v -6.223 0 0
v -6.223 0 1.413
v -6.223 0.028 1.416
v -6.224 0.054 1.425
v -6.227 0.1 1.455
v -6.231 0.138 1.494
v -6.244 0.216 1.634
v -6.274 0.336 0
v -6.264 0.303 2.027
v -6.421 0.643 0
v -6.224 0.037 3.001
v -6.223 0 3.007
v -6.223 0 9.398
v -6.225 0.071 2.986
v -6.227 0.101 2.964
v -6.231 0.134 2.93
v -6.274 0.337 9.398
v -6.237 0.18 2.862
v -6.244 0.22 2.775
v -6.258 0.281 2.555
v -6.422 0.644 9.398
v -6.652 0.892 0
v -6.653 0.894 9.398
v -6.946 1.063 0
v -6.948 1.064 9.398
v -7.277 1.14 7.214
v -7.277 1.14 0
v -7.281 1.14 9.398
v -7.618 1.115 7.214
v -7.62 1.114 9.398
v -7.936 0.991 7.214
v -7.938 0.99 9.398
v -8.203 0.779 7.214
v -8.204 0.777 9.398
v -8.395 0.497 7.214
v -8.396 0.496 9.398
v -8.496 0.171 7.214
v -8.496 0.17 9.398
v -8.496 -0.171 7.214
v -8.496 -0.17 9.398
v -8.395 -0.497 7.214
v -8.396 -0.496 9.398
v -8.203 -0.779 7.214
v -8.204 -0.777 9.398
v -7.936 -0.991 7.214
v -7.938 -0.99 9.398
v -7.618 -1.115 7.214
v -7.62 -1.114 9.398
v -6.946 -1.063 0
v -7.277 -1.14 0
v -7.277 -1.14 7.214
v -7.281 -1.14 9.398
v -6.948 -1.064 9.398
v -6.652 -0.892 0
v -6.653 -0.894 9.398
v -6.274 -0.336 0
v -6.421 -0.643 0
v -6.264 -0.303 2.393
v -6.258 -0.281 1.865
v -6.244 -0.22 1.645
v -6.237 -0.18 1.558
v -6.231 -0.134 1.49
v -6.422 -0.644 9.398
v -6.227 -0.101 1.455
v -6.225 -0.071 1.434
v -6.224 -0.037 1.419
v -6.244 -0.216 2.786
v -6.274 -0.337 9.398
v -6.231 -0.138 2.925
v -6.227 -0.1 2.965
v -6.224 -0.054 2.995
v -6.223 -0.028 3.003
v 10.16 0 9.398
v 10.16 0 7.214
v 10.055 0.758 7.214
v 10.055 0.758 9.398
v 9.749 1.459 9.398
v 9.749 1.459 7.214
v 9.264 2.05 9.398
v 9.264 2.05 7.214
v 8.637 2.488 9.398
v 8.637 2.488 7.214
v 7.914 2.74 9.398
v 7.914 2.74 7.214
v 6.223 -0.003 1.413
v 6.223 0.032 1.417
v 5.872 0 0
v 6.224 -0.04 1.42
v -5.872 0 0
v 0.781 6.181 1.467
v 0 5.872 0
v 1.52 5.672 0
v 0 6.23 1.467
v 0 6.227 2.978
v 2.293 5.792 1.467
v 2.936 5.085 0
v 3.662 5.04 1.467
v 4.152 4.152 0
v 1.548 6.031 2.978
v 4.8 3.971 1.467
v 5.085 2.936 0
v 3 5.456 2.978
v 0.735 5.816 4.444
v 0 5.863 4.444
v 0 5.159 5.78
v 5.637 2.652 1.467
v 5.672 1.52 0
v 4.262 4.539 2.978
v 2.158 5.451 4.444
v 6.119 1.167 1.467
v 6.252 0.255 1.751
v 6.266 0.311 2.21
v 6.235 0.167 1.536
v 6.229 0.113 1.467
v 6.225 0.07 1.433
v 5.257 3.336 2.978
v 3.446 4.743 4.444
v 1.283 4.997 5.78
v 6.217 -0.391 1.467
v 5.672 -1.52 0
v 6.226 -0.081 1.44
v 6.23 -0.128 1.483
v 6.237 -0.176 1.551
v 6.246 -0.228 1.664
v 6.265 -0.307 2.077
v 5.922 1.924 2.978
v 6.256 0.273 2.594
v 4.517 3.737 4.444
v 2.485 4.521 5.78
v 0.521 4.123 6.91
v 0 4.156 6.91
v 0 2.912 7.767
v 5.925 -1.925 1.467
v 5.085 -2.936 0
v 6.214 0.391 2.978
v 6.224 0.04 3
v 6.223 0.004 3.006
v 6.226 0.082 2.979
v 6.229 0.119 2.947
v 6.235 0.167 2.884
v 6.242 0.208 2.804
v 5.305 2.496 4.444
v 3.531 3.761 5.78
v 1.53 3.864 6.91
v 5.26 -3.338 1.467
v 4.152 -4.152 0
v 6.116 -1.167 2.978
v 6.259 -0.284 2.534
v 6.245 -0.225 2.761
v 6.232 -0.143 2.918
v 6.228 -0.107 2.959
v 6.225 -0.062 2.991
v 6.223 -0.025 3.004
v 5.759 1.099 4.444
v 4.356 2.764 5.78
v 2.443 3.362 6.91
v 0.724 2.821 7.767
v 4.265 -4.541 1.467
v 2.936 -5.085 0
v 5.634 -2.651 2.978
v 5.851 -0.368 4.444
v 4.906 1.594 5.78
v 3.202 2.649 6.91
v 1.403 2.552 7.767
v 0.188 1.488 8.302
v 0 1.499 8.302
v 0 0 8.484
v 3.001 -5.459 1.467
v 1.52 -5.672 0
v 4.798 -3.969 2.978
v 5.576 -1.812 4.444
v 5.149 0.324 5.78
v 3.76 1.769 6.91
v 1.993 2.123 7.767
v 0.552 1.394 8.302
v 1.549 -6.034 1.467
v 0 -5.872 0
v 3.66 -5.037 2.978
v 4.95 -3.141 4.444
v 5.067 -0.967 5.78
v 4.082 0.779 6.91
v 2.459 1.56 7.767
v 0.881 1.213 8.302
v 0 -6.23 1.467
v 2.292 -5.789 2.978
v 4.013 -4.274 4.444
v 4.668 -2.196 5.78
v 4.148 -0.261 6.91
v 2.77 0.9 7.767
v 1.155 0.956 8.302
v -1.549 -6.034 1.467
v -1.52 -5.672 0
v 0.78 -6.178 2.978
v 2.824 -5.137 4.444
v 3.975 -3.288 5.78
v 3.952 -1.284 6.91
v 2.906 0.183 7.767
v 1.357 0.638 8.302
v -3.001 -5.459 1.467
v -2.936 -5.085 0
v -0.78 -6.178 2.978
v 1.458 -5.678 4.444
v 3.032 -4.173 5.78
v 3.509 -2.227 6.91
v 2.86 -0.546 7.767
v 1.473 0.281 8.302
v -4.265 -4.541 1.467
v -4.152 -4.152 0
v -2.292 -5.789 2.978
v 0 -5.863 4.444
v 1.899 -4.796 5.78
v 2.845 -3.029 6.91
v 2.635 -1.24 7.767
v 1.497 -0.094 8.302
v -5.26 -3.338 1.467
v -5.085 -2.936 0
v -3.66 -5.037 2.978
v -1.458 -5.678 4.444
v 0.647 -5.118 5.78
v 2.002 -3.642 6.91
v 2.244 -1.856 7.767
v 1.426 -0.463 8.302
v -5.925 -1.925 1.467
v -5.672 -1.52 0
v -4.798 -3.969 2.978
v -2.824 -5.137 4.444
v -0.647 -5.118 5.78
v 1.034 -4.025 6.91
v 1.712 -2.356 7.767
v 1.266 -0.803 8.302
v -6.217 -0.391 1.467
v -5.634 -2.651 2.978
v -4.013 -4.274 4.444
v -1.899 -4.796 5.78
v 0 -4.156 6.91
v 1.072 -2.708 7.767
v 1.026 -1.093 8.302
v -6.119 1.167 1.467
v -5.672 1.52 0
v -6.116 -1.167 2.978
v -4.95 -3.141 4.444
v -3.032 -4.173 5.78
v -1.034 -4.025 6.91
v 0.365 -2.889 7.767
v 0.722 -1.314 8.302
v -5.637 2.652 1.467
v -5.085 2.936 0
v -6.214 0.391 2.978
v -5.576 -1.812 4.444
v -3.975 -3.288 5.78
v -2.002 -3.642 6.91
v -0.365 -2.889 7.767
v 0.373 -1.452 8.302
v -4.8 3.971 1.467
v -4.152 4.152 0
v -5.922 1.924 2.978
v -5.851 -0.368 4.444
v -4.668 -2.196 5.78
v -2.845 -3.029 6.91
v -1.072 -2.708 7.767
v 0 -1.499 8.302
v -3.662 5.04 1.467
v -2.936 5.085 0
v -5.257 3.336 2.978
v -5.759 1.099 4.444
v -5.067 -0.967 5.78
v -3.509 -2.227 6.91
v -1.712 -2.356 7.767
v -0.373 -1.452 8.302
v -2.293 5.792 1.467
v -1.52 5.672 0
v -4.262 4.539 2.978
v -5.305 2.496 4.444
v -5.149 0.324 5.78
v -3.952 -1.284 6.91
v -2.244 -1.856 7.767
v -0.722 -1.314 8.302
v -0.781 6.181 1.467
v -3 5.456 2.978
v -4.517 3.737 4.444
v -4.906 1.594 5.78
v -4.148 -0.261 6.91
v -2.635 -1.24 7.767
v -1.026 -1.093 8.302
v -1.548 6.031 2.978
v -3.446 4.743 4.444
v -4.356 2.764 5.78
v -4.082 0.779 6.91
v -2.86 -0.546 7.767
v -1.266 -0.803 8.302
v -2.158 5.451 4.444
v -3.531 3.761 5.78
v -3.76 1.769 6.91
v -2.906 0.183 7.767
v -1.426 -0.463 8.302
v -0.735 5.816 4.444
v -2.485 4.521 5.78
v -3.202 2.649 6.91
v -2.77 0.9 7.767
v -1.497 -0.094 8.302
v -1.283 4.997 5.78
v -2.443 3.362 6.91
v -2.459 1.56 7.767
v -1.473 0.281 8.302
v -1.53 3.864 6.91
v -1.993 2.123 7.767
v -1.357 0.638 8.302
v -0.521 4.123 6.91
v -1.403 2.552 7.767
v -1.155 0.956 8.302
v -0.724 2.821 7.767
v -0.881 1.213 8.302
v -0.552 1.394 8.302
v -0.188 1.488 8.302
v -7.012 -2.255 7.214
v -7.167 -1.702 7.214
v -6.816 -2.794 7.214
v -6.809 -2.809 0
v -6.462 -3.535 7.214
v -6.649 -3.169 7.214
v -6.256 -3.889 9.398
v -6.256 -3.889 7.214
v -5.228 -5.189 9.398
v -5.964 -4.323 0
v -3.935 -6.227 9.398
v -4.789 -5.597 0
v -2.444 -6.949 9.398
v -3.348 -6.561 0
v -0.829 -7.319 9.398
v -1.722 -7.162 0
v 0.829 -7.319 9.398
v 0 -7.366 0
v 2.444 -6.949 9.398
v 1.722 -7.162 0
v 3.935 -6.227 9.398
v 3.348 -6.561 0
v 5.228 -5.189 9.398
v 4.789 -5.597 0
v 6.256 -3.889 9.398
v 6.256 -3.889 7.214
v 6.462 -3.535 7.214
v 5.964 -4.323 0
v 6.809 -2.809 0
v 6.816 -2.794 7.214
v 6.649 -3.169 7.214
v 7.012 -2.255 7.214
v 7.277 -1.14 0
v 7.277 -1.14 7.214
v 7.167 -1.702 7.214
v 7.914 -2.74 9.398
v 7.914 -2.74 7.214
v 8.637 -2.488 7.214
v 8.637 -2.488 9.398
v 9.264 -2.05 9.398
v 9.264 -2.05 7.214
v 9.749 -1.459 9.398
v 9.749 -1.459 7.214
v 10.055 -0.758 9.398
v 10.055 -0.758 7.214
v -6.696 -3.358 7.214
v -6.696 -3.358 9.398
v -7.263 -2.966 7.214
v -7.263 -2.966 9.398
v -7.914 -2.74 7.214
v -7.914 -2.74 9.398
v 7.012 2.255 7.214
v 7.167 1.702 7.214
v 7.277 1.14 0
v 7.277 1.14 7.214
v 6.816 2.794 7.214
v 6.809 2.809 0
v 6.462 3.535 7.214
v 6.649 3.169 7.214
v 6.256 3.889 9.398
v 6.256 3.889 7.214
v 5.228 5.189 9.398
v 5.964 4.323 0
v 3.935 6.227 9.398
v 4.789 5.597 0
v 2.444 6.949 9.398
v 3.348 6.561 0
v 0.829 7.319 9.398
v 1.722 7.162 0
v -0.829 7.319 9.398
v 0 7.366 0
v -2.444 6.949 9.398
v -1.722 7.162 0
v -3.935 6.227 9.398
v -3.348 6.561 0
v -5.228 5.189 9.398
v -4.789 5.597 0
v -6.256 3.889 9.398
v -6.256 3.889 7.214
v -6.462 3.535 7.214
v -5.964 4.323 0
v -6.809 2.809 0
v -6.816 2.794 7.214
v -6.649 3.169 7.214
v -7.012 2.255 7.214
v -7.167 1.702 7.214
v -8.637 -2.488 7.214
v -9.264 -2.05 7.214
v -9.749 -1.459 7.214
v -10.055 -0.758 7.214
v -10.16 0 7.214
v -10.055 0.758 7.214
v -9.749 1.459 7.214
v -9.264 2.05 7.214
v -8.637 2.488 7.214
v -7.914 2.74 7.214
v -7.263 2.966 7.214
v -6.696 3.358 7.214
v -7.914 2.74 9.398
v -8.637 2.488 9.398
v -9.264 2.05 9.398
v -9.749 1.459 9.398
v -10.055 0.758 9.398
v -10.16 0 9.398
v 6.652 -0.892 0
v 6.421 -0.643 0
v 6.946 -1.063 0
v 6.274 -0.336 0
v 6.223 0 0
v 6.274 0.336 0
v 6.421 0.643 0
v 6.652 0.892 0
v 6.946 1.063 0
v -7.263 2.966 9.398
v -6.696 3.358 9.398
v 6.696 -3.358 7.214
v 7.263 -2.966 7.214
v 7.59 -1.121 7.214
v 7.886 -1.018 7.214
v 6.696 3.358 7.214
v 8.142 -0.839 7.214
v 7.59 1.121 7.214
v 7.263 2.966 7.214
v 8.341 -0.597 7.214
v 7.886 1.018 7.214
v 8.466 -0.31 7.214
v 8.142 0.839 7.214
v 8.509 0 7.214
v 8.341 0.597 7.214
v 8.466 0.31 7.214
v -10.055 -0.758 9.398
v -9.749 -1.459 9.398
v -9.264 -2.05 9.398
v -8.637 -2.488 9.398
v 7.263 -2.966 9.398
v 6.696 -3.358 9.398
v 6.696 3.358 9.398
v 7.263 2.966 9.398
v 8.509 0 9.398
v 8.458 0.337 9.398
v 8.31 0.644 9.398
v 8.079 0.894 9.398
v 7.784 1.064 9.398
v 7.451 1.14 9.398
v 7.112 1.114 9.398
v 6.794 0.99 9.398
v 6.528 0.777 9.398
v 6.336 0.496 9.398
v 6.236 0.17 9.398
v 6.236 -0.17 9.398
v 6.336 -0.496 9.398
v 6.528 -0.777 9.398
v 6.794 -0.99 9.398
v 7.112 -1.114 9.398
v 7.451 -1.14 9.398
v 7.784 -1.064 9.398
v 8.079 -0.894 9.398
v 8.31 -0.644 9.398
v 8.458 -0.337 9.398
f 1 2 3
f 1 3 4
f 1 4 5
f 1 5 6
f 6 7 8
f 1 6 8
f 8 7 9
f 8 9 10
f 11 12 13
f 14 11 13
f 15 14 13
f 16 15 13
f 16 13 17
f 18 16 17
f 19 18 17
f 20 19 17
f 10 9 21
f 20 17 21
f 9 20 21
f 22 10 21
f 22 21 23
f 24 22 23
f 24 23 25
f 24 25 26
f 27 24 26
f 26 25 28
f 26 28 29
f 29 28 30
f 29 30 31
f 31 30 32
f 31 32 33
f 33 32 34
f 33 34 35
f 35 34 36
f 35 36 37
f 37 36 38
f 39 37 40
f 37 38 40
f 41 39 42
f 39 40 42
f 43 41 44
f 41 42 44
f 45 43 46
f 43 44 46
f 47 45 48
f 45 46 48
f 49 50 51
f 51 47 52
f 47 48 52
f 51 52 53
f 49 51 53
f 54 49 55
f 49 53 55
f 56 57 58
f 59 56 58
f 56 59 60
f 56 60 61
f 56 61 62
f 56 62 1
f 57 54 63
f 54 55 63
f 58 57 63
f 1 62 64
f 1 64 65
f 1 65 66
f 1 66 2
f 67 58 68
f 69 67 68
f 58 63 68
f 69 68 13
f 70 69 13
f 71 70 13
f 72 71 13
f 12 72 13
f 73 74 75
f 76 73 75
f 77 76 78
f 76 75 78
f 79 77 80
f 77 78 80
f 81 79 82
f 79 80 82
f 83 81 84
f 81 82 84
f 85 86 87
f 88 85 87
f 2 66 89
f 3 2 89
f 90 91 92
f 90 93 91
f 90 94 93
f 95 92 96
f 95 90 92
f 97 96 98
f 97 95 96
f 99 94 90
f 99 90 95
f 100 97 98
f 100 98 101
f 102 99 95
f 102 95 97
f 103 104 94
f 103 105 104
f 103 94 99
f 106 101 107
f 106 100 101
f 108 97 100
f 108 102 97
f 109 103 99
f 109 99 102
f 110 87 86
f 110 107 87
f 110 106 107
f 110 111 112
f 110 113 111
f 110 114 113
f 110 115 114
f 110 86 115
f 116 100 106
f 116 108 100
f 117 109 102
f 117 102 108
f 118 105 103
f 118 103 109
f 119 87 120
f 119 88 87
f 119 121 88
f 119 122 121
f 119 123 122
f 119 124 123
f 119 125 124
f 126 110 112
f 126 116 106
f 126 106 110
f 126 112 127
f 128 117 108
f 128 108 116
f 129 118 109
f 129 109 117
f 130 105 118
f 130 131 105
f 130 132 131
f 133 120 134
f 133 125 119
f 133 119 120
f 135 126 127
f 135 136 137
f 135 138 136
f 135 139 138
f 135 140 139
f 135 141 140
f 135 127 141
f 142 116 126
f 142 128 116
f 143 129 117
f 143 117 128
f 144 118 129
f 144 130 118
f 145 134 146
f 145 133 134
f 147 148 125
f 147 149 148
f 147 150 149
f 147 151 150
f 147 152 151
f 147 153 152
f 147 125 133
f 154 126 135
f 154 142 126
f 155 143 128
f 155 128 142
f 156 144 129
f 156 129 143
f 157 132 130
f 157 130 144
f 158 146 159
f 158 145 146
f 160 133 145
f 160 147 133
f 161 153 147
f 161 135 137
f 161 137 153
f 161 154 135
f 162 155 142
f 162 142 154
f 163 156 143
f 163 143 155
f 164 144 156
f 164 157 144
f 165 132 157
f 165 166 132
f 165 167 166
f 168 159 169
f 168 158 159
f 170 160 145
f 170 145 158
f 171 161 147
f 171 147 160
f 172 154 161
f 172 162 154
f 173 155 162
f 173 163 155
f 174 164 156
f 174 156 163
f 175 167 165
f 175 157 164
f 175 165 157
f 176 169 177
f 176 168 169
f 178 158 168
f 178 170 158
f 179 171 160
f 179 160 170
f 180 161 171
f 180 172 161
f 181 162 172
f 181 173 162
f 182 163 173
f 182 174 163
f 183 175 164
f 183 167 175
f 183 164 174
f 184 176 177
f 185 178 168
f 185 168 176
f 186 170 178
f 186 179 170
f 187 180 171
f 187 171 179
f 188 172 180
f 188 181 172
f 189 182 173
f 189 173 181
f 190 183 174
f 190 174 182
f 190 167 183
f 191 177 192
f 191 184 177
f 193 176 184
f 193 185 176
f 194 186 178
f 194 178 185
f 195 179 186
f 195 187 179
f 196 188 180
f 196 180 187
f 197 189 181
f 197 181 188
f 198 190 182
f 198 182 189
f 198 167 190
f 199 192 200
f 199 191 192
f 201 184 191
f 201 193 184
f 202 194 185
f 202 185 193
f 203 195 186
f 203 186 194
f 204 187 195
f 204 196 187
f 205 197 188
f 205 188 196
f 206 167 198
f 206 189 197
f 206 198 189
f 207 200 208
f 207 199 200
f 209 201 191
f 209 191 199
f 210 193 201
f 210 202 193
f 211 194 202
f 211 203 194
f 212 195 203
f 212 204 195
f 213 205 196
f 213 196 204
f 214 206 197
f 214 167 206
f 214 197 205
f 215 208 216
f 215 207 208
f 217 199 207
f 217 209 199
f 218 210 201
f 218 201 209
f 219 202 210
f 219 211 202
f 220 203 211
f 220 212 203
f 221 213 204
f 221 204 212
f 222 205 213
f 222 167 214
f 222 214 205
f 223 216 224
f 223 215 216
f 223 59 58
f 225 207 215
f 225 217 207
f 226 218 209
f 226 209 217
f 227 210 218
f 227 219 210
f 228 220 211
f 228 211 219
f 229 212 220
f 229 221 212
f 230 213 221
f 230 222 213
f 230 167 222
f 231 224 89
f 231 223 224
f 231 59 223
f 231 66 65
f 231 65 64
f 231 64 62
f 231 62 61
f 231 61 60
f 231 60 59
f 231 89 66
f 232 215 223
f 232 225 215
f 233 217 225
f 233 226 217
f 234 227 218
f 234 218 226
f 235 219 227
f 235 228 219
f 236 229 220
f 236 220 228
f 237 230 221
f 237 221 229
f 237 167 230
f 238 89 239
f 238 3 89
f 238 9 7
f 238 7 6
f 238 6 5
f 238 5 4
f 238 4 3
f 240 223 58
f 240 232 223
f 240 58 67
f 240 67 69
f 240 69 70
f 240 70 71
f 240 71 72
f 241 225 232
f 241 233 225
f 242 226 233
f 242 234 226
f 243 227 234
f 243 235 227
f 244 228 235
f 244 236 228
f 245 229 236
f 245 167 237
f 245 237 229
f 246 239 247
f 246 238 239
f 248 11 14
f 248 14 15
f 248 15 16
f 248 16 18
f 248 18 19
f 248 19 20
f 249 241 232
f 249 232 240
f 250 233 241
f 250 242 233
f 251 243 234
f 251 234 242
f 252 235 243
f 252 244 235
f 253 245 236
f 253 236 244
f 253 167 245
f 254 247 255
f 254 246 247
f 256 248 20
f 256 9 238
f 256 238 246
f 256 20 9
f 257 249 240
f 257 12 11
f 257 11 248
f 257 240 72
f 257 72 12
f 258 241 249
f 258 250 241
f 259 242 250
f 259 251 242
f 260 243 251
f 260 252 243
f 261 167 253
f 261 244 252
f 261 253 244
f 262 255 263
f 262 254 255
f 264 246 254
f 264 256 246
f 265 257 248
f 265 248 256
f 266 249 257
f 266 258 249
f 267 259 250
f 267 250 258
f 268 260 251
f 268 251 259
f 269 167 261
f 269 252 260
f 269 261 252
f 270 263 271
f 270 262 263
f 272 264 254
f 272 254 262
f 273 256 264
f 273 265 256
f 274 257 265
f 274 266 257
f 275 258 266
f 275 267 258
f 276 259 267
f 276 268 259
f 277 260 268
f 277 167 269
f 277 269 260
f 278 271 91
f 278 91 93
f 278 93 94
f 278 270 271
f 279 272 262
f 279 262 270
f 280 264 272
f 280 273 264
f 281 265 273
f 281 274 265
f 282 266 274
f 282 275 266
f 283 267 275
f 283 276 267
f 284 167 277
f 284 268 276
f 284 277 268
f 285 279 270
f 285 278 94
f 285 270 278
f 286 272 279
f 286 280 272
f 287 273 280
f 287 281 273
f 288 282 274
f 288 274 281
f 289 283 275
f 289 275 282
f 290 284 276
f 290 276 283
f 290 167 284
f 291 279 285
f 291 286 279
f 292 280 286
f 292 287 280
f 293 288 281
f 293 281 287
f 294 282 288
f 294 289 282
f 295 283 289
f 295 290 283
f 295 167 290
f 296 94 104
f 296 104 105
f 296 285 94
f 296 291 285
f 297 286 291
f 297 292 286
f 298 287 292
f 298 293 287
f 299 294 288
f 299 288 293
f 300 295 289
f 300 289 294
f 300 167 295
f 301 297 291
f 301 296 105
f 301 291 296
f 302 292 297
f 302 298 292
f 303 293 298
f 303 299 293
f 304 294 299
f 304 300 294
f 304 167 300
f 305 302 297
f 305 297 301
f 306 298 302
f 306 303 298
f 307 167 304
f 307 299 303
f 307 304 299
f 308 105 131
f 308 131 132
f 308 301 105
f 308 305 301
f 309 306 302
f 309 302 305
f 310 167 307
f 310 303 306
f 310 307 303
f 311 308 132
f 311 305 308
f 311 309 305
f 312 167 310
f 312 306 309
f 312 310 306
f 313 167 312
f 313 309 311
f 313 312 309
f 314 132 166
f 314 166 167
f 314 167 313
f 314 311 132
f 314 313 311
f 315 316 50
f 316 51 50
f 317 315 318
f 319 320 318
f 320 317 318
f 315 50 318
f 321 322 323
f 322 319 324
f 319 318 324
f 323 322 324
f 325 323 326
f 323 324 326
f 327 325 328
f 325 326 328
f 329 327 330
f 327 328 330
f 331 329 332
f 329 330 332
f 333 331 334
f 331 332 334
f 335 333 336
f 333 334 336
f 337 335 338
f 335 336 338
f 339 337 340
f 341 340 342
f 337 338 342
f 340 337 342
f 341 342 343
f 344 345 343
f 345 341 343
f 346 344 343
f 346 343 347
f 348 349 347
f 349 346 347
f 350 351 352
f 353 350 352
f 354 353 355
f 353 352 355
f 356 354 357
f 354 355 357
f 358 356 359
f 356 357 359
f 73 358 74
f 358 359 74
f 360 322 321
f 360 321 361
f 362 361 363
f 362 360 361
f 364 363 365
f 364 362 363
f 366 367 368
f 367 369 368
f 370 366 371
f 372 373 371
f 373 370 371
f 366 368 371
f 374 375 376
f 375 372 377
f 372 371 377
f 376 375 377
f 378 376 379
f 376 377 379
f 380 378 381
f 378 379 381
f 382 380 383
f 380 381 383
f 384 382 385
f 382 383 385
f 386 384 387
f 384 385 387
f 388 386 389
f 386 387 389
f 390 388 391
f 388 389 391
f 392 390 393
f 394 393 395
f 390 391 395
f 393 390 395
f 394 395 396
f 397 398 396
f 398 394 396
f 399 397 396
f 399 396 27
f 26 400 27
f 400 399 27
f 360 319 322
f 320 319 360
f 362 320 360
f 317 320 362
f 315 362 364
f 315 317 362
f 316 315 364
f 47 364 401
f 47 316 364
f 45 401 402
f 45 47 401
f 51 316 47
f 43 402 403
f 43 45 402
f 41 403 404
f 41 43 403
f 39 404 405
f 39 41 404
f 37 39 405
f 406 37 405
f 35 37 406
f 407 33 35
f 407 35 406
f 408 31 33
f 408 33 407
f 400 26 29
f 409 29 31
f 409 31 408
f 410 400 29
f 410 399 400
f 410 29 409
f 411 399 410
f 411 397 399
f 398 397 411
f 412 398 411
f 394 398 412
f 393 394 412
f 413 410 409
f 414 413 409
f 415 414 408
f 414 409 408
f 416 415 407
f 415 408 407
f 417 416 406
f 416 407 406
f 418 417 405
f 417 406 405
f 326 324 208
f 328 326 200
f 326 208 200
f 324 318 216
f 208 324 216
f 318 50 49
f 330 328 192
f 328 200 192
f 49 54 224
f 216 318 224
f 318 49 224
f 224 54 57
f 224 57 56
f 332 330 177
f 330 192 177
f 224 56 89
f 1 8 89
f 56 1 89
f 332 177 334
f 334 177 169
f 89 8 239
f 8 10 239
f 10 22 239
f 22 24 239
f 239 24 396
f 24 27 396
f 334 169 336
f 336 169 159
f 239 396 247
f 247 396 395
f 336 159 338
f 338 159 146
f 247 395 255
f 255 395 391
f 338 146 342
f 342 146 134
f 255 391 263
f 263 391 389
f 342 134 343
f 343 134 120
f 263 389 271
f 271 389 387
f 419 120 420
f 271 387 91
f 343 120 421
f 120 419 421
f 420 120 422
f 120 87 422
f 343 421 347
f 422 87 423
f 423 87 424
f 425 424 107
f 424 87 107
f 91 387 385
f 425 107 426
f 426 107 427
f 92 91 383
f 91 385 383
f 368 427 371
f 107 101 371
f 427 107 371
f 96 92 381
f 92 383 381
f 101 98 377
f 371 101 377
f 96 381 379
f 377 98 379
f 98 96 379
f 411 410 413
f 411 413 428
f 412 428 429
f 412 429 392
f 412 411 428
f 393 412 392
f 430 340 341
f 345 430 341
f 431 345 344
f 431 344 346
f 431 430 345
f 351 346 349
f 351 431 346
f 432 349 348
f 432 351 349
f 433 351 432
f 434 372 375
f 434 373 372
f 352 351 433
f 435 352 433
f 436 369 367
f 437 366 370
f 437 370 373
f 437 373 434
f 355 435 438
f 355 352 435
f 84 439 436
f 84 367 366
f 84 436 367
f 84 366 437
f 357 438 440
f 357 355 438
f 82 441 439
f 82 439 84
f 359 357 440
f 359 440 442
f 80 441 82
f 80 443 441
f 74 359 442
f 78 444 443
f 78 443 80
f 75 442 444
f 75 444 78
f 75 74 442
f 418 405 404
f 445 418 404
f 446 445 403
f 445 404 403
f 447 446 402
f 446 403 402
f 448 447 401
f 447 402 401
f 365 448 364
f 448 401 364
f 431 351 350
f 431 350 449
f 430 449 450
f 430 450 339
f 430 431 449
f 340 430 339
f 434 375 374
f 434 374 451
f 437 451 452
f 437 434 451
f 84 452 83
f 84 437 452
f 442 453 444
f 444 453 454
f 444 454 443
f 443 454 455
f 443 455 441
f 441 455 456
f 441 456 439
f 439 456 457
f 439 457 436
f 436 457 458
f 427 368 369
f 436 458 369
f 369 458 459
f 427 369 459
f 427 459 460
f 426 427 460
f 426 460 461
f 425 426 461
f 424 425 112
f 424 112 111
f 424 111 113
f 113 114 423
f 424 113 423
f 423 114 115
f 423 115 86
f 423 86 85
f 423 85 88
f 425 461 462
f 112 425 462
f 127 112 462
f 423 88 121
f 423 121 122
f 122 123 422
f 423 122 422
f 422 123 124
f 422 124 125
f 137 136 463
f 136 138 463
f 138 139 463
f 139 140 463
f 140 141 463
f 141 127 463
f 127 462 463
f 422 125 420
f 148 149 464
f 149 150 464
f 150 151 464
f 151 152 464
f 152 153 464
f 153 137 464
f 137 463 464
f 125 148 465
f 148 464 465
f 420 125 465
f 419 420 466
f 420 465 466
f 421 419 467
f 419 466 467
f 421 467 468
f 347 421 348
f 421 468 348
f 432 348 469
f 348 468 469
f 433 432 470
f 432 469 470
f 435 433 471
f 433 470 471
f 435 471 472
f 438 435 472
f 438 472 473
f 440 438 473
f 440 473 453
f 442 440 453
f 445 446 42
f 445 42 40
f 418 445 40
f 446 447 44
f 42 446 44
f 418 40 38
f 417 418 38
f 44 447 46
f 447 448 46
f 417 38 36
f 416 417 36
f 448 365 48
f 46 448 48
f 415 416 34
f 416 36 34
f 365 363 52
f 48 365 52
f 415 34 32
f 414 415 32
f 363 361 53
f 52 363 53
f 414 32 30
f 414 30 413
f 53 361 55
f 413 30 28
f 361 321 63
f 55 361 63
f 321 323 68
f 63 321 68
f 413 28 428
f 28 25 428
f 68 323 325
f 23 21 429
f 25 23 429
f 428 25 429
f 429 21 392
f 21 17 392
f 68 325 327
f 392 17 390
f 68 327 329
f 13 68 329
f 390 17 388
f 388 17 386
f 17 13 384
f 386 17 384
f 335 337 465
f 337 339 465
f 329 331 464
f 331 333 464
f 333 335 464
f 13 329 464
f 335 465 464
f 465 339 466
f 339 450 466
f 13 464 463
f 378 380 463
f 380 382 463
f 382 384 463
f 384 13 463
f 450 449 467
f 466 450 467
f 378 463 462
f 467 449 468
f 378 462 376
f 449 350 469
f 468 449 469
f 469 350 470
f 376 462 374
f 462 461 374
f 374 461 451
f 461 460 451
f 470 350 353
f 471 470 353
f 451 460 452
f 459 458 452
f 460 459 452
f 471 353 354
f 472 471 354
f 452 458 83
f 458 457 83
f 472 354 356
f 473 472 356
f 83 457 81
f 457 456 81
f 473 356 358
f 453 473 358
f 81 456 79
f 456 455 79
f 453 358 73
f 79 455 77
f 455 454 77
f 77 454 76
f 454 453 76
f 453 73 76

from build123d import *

# Parameters (mm, degrees)
ESQUISSE1_R             = 7.366
BOSS_EXTRU_1_DEPTH      = 9.398
BOSS_EXTRU_2_START      = -2.1844
BOSS_EXTRU_2_DEPTH      = 2.1844
CONG_1_R                = 2.54
ESQUISSE3_R             = 1.143
ENL_V_MAT_EXTRU_2_DEPTH = 16.678200152


with BuildPart() as part:
    # Esquisse1 → Boss.-Extru.1 (new body)
    with BuildSketch(Plane.XY):
        Circle(ESQUISSE1_R)
    extrude(amount=BOSS_EXTRU_1_DEPTH)

    # Esquisse2 → Boss.-Extru.2 (add)
    with BuildSketch(Plane.XY.offset(9.398).offset(BOSS_EXTRU_2_START)):
        with BuildLine():
            Line((7.366, 2.794), (6.815535195, 2.794))
            ThreePointArc((6.815535195, 2.794), (7.22707369, 1.423854584), (7.366, 0))
            Line((7.366, 0), (10.16, 0))
            ThreePointArc((10.16, 0), (9.341656347, 1.975656347), (7.366, 2.794))
        make_face()
        with BuildLine():
            Line((10.16, 0), (7.366, 0))
            ThreePointArc((7.366, 0), (7.22707369, -1.423854584), (6.815535195, -2.794))
            Line((6.815535195, -2.794), (7.366, -2.794))
            ThreePointArc((7.366, -2.794), (9.341656347, -1.975656347), (10.16, 0))
        make_face()
        with BuildLine():
            Line((-7.366, 0), (-10.16, 0))
            ThreePointArc((-10.16, 0), (-9.341656347, -1.975656347), (-7.366, -2.794))
            Line((-7.366, -2.794), (-6.815535195, -2.794))
            ThreePointArc((-6.815535195, -2.794), (-7.22707369, -1.423854584), (-7.366, 0))
        make_face()
        with BuildLine():
            Line((-6.815535195, 2.794), (-7.366, 2.794))
            ThreePointArc((-7.366, 2.794), (-9.341656347, 1.975656347), (-10.16, 0))
            Line((-10.16, 0), (-7.366, 0))
            ThreePointArc((-7.366, 0), (-7.22707369, 1.423854584), (-6.815535195, 2.794))
        make_face()
    extrude(amount=BOSS_EXTRU_2_DEPTH)

    # Congé1
    # the kernel refuses this fillet: 2.54 mm, written as the material it adds along each edge
    with BuildSketch(Plane(origin=(6.815535195, 2.794, 7.2136), x_dir=(-0.45524151464262924, 0.8903679932173465, 0), z_dir=(0, 0, 1)), Plane(origin=(-6.815535195, -2.794, 7.2136), x_dir=(0.4552415146426176, -0.8903679932173524, 0), z_dir=(0, 0, 1))) as cong_1_piece_1:
        with BuildLine():
            CenterArc((1.442130851, -2.531130754), CONG_1_R, 94.789504406, 46.813825589)
            Line((-0.548542223, -0.953531086), (-0.74760953, -0.795771119))
            ThreePointArc((-0.74760953, -0.795771119), (-0.476747902, -0.374484899), (-0.22615347, 0.115631345))
            Line((-0.22615347, 0.115631345), (0.021207807, 0.253113075))
            ThreePointArc((0.021207807, 0.253113075), (0.615026392, 0.228279187), (1.208844978, 0.253113075))
            Line((1.208844978, 0.253113075), (1.230052785, 0))
        make_face()
    extrude(amount=2.1844)
    with BuildSketch(Plane(origin=(6.815535195, -2.794, 7.2136), x_dir=(-0.4552415146426287, -0.8903679932173468, 0), z_dir=(0, 0, 1)), Plane(origin=(-6.815535195, 2.794, 7.2136), x_dir=(0.45524151464261825, 0.890367993217352, 0), z_dir=(0, 0, 1))) as cong_1_piece_2:
        with BuildLine():
            CenterArc((1.442130851, 2.531130754), CONG_1_R, 218.396670004, 46.813825589)
            Line((-0.548542223, 0.953531086), (-0.74760953, 0.795771119))
            ThreePointArc((-0.74760953, 0.795771119), (-0.476747902, 0.374484899), (-0.22615347, -0.115631345))
            Line((-0.22615347, -0.115631345), (0.021207807, -0.253113075))
            ThreePointArc((0.021207807, -0.253113075), (0.615026392, -0.228279187), (1.208844978, -0.253113075))
            Line((1.208844978, -0.253113075), (1.230052785, 0))
        make_face()
    extrude(amount=2.1844)

    # Esquisse3 → Enlèv. mat.-Extru.2 (cut, through all)
    with BuildSketch(Plane.XY.offset(9.398)):
        with Locations((-7.366, 0)):
            Circle(ESQUISSE3_R)
        with Locations((7.366, 0)):
            Circle(ESQUISSE3_R)
    extrude(amount=-ENL_V_MAT_EXTRU_2_DEPTH, mode=Mode.SUBTRACT)

    # Esquisse4 → Cut-Revolve1 (revolve, cut)
    with BuildSketch(Plane(origin=(0, 0, 0), x_dir=(0, 0, -1), z_dir=(1, 0, 0))):
        with BuildLine():
            Line((-8.4836, 0), (4.064, 0))
            ThreePointArc((4.064, 0), (-2.2098, 6.2738), (-8.4836, 0))
        make_face()
    revolve(axis=Axis((0, 0, 7.037287666), (0, 0, -1)), mode=Mode.SUBTRACT)


solid = part.part
